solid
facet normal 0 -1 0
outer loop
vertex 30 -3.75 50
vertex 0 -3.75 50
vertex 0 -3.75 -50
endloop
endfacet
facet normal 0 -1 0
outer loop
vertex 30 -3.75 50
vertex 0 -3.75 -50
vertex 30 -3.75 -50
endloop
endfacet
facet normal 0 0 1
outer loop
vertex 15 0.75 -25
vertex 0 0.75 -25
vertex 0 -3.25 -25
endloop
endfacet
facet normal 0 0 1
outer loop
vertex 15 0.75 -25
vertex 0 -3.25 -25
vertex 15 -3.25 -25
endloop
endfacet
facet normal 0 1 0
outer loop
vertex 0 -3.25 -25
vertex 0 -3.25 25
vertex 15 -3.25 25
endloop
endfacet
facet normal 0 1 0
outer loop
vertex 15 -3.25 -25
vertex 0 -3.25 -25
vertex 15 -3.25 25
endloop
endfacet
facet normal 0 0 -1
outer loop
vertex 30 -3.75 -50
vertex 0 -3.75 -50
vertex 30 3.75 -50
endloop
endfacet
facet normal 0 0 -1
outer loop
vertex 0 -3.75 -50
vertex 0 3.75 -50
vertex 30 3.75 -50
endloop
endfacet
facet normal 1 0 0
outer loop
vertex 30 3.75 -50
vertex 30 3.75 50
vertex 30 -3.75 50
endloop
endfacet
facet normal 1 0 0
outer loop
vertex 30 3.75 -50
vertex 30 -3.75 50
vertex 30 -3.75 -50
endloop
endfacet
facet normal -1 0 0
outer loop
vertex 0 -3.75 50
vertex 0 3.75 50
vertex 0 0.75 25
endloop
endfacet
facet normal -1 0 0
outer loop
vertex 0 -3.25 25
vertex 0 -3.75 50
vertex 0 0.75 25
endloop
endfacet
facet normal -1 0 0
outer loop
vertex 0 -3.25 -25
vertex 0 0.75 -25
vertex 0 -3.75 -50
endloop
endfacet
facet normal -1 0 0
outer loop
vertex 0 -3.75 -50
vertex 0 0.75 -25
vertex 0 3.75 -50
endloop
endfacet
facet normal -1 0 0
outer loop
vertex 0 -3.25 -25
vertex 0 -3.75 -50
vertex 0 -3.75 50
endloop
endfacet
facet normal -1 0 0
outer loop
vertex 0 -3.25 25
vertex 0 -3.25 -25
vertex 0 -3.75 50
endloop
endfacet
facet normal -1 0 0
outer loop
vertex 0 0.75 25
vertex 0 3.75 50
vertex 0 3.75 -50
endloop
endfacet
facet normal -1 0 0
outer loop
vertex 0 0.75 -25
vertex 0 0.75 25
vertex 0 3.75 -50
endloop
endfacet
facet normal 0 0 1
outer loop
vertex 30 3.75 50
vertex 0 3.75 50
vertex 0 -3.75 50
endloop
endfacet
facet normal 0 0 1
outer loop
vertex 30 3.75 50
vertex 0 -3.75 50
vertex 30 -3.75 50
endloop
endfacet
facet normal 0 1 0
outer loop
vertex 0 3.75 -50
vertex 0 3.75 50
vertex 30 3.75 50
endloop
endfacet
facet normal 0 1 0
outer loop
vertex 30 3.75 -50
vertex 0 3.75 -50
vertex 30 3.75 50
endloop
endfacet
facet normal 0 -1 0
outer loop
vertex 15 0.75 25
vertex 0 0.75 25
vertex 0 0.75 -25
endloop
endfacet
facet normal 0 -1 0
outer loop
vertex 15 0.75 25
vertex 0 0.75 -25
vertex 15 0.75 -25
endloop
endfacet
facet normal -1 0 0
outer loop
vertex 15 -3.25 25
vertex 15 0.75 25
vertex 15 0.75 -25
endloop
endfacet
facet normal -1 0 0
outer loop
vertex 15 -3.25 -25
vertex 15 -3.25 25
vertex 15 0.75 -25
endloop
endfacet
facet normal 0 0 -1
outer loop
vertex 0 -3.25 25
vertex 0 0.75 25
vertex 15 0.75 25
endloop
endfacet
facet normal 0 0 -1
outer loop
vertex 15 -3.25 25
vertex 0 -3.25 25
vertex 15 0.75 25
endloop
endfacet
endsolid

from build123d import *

# Parameters (mm, degrees)
SKETCH1_W           = 30
SKETCH1_H           = 100
BOSS_EXTRUDE1_DEPTH = 3.75
CUT_EXTRUDE1_START  = -3
SKETCH2_W           = 15
SKETCH2_H           = 50
CUT_EXTRUDE1_DEPTH  = 4


with BuildPart() as part:
    # Sketch1 → Boss-Extrude1 (new, symmetric)
    with BuildSketch(Plane(origin=(0, 0, 0), x_dir=(1, 0, 0), z_dir=(0, 1, 0))):
        with Locations((15, 0)):
            Rectangle(SKETCH1_W, SKETCH1_H)
    extrude(amount=BOSS_EXTRUDE1_DEPTH, both=True)

    # Sketch2 → Cut-Extrude1 (cut)
    with BuildSketch(Plane(origin=(0, 3.75, 0), x_dir=(1, 0, 0), z_dir=(0, 1, 0)).offset(CUT_EXTRUDE1_START)):
        with Locations((7.5, 0)):
            Rectangle(SKETCH2_W, SKETCH2_H)
    extrude(amount=-CUT_EXTRUDE1_DEPTH, mode=Mode.SUBTRACT)


solid = part.part
